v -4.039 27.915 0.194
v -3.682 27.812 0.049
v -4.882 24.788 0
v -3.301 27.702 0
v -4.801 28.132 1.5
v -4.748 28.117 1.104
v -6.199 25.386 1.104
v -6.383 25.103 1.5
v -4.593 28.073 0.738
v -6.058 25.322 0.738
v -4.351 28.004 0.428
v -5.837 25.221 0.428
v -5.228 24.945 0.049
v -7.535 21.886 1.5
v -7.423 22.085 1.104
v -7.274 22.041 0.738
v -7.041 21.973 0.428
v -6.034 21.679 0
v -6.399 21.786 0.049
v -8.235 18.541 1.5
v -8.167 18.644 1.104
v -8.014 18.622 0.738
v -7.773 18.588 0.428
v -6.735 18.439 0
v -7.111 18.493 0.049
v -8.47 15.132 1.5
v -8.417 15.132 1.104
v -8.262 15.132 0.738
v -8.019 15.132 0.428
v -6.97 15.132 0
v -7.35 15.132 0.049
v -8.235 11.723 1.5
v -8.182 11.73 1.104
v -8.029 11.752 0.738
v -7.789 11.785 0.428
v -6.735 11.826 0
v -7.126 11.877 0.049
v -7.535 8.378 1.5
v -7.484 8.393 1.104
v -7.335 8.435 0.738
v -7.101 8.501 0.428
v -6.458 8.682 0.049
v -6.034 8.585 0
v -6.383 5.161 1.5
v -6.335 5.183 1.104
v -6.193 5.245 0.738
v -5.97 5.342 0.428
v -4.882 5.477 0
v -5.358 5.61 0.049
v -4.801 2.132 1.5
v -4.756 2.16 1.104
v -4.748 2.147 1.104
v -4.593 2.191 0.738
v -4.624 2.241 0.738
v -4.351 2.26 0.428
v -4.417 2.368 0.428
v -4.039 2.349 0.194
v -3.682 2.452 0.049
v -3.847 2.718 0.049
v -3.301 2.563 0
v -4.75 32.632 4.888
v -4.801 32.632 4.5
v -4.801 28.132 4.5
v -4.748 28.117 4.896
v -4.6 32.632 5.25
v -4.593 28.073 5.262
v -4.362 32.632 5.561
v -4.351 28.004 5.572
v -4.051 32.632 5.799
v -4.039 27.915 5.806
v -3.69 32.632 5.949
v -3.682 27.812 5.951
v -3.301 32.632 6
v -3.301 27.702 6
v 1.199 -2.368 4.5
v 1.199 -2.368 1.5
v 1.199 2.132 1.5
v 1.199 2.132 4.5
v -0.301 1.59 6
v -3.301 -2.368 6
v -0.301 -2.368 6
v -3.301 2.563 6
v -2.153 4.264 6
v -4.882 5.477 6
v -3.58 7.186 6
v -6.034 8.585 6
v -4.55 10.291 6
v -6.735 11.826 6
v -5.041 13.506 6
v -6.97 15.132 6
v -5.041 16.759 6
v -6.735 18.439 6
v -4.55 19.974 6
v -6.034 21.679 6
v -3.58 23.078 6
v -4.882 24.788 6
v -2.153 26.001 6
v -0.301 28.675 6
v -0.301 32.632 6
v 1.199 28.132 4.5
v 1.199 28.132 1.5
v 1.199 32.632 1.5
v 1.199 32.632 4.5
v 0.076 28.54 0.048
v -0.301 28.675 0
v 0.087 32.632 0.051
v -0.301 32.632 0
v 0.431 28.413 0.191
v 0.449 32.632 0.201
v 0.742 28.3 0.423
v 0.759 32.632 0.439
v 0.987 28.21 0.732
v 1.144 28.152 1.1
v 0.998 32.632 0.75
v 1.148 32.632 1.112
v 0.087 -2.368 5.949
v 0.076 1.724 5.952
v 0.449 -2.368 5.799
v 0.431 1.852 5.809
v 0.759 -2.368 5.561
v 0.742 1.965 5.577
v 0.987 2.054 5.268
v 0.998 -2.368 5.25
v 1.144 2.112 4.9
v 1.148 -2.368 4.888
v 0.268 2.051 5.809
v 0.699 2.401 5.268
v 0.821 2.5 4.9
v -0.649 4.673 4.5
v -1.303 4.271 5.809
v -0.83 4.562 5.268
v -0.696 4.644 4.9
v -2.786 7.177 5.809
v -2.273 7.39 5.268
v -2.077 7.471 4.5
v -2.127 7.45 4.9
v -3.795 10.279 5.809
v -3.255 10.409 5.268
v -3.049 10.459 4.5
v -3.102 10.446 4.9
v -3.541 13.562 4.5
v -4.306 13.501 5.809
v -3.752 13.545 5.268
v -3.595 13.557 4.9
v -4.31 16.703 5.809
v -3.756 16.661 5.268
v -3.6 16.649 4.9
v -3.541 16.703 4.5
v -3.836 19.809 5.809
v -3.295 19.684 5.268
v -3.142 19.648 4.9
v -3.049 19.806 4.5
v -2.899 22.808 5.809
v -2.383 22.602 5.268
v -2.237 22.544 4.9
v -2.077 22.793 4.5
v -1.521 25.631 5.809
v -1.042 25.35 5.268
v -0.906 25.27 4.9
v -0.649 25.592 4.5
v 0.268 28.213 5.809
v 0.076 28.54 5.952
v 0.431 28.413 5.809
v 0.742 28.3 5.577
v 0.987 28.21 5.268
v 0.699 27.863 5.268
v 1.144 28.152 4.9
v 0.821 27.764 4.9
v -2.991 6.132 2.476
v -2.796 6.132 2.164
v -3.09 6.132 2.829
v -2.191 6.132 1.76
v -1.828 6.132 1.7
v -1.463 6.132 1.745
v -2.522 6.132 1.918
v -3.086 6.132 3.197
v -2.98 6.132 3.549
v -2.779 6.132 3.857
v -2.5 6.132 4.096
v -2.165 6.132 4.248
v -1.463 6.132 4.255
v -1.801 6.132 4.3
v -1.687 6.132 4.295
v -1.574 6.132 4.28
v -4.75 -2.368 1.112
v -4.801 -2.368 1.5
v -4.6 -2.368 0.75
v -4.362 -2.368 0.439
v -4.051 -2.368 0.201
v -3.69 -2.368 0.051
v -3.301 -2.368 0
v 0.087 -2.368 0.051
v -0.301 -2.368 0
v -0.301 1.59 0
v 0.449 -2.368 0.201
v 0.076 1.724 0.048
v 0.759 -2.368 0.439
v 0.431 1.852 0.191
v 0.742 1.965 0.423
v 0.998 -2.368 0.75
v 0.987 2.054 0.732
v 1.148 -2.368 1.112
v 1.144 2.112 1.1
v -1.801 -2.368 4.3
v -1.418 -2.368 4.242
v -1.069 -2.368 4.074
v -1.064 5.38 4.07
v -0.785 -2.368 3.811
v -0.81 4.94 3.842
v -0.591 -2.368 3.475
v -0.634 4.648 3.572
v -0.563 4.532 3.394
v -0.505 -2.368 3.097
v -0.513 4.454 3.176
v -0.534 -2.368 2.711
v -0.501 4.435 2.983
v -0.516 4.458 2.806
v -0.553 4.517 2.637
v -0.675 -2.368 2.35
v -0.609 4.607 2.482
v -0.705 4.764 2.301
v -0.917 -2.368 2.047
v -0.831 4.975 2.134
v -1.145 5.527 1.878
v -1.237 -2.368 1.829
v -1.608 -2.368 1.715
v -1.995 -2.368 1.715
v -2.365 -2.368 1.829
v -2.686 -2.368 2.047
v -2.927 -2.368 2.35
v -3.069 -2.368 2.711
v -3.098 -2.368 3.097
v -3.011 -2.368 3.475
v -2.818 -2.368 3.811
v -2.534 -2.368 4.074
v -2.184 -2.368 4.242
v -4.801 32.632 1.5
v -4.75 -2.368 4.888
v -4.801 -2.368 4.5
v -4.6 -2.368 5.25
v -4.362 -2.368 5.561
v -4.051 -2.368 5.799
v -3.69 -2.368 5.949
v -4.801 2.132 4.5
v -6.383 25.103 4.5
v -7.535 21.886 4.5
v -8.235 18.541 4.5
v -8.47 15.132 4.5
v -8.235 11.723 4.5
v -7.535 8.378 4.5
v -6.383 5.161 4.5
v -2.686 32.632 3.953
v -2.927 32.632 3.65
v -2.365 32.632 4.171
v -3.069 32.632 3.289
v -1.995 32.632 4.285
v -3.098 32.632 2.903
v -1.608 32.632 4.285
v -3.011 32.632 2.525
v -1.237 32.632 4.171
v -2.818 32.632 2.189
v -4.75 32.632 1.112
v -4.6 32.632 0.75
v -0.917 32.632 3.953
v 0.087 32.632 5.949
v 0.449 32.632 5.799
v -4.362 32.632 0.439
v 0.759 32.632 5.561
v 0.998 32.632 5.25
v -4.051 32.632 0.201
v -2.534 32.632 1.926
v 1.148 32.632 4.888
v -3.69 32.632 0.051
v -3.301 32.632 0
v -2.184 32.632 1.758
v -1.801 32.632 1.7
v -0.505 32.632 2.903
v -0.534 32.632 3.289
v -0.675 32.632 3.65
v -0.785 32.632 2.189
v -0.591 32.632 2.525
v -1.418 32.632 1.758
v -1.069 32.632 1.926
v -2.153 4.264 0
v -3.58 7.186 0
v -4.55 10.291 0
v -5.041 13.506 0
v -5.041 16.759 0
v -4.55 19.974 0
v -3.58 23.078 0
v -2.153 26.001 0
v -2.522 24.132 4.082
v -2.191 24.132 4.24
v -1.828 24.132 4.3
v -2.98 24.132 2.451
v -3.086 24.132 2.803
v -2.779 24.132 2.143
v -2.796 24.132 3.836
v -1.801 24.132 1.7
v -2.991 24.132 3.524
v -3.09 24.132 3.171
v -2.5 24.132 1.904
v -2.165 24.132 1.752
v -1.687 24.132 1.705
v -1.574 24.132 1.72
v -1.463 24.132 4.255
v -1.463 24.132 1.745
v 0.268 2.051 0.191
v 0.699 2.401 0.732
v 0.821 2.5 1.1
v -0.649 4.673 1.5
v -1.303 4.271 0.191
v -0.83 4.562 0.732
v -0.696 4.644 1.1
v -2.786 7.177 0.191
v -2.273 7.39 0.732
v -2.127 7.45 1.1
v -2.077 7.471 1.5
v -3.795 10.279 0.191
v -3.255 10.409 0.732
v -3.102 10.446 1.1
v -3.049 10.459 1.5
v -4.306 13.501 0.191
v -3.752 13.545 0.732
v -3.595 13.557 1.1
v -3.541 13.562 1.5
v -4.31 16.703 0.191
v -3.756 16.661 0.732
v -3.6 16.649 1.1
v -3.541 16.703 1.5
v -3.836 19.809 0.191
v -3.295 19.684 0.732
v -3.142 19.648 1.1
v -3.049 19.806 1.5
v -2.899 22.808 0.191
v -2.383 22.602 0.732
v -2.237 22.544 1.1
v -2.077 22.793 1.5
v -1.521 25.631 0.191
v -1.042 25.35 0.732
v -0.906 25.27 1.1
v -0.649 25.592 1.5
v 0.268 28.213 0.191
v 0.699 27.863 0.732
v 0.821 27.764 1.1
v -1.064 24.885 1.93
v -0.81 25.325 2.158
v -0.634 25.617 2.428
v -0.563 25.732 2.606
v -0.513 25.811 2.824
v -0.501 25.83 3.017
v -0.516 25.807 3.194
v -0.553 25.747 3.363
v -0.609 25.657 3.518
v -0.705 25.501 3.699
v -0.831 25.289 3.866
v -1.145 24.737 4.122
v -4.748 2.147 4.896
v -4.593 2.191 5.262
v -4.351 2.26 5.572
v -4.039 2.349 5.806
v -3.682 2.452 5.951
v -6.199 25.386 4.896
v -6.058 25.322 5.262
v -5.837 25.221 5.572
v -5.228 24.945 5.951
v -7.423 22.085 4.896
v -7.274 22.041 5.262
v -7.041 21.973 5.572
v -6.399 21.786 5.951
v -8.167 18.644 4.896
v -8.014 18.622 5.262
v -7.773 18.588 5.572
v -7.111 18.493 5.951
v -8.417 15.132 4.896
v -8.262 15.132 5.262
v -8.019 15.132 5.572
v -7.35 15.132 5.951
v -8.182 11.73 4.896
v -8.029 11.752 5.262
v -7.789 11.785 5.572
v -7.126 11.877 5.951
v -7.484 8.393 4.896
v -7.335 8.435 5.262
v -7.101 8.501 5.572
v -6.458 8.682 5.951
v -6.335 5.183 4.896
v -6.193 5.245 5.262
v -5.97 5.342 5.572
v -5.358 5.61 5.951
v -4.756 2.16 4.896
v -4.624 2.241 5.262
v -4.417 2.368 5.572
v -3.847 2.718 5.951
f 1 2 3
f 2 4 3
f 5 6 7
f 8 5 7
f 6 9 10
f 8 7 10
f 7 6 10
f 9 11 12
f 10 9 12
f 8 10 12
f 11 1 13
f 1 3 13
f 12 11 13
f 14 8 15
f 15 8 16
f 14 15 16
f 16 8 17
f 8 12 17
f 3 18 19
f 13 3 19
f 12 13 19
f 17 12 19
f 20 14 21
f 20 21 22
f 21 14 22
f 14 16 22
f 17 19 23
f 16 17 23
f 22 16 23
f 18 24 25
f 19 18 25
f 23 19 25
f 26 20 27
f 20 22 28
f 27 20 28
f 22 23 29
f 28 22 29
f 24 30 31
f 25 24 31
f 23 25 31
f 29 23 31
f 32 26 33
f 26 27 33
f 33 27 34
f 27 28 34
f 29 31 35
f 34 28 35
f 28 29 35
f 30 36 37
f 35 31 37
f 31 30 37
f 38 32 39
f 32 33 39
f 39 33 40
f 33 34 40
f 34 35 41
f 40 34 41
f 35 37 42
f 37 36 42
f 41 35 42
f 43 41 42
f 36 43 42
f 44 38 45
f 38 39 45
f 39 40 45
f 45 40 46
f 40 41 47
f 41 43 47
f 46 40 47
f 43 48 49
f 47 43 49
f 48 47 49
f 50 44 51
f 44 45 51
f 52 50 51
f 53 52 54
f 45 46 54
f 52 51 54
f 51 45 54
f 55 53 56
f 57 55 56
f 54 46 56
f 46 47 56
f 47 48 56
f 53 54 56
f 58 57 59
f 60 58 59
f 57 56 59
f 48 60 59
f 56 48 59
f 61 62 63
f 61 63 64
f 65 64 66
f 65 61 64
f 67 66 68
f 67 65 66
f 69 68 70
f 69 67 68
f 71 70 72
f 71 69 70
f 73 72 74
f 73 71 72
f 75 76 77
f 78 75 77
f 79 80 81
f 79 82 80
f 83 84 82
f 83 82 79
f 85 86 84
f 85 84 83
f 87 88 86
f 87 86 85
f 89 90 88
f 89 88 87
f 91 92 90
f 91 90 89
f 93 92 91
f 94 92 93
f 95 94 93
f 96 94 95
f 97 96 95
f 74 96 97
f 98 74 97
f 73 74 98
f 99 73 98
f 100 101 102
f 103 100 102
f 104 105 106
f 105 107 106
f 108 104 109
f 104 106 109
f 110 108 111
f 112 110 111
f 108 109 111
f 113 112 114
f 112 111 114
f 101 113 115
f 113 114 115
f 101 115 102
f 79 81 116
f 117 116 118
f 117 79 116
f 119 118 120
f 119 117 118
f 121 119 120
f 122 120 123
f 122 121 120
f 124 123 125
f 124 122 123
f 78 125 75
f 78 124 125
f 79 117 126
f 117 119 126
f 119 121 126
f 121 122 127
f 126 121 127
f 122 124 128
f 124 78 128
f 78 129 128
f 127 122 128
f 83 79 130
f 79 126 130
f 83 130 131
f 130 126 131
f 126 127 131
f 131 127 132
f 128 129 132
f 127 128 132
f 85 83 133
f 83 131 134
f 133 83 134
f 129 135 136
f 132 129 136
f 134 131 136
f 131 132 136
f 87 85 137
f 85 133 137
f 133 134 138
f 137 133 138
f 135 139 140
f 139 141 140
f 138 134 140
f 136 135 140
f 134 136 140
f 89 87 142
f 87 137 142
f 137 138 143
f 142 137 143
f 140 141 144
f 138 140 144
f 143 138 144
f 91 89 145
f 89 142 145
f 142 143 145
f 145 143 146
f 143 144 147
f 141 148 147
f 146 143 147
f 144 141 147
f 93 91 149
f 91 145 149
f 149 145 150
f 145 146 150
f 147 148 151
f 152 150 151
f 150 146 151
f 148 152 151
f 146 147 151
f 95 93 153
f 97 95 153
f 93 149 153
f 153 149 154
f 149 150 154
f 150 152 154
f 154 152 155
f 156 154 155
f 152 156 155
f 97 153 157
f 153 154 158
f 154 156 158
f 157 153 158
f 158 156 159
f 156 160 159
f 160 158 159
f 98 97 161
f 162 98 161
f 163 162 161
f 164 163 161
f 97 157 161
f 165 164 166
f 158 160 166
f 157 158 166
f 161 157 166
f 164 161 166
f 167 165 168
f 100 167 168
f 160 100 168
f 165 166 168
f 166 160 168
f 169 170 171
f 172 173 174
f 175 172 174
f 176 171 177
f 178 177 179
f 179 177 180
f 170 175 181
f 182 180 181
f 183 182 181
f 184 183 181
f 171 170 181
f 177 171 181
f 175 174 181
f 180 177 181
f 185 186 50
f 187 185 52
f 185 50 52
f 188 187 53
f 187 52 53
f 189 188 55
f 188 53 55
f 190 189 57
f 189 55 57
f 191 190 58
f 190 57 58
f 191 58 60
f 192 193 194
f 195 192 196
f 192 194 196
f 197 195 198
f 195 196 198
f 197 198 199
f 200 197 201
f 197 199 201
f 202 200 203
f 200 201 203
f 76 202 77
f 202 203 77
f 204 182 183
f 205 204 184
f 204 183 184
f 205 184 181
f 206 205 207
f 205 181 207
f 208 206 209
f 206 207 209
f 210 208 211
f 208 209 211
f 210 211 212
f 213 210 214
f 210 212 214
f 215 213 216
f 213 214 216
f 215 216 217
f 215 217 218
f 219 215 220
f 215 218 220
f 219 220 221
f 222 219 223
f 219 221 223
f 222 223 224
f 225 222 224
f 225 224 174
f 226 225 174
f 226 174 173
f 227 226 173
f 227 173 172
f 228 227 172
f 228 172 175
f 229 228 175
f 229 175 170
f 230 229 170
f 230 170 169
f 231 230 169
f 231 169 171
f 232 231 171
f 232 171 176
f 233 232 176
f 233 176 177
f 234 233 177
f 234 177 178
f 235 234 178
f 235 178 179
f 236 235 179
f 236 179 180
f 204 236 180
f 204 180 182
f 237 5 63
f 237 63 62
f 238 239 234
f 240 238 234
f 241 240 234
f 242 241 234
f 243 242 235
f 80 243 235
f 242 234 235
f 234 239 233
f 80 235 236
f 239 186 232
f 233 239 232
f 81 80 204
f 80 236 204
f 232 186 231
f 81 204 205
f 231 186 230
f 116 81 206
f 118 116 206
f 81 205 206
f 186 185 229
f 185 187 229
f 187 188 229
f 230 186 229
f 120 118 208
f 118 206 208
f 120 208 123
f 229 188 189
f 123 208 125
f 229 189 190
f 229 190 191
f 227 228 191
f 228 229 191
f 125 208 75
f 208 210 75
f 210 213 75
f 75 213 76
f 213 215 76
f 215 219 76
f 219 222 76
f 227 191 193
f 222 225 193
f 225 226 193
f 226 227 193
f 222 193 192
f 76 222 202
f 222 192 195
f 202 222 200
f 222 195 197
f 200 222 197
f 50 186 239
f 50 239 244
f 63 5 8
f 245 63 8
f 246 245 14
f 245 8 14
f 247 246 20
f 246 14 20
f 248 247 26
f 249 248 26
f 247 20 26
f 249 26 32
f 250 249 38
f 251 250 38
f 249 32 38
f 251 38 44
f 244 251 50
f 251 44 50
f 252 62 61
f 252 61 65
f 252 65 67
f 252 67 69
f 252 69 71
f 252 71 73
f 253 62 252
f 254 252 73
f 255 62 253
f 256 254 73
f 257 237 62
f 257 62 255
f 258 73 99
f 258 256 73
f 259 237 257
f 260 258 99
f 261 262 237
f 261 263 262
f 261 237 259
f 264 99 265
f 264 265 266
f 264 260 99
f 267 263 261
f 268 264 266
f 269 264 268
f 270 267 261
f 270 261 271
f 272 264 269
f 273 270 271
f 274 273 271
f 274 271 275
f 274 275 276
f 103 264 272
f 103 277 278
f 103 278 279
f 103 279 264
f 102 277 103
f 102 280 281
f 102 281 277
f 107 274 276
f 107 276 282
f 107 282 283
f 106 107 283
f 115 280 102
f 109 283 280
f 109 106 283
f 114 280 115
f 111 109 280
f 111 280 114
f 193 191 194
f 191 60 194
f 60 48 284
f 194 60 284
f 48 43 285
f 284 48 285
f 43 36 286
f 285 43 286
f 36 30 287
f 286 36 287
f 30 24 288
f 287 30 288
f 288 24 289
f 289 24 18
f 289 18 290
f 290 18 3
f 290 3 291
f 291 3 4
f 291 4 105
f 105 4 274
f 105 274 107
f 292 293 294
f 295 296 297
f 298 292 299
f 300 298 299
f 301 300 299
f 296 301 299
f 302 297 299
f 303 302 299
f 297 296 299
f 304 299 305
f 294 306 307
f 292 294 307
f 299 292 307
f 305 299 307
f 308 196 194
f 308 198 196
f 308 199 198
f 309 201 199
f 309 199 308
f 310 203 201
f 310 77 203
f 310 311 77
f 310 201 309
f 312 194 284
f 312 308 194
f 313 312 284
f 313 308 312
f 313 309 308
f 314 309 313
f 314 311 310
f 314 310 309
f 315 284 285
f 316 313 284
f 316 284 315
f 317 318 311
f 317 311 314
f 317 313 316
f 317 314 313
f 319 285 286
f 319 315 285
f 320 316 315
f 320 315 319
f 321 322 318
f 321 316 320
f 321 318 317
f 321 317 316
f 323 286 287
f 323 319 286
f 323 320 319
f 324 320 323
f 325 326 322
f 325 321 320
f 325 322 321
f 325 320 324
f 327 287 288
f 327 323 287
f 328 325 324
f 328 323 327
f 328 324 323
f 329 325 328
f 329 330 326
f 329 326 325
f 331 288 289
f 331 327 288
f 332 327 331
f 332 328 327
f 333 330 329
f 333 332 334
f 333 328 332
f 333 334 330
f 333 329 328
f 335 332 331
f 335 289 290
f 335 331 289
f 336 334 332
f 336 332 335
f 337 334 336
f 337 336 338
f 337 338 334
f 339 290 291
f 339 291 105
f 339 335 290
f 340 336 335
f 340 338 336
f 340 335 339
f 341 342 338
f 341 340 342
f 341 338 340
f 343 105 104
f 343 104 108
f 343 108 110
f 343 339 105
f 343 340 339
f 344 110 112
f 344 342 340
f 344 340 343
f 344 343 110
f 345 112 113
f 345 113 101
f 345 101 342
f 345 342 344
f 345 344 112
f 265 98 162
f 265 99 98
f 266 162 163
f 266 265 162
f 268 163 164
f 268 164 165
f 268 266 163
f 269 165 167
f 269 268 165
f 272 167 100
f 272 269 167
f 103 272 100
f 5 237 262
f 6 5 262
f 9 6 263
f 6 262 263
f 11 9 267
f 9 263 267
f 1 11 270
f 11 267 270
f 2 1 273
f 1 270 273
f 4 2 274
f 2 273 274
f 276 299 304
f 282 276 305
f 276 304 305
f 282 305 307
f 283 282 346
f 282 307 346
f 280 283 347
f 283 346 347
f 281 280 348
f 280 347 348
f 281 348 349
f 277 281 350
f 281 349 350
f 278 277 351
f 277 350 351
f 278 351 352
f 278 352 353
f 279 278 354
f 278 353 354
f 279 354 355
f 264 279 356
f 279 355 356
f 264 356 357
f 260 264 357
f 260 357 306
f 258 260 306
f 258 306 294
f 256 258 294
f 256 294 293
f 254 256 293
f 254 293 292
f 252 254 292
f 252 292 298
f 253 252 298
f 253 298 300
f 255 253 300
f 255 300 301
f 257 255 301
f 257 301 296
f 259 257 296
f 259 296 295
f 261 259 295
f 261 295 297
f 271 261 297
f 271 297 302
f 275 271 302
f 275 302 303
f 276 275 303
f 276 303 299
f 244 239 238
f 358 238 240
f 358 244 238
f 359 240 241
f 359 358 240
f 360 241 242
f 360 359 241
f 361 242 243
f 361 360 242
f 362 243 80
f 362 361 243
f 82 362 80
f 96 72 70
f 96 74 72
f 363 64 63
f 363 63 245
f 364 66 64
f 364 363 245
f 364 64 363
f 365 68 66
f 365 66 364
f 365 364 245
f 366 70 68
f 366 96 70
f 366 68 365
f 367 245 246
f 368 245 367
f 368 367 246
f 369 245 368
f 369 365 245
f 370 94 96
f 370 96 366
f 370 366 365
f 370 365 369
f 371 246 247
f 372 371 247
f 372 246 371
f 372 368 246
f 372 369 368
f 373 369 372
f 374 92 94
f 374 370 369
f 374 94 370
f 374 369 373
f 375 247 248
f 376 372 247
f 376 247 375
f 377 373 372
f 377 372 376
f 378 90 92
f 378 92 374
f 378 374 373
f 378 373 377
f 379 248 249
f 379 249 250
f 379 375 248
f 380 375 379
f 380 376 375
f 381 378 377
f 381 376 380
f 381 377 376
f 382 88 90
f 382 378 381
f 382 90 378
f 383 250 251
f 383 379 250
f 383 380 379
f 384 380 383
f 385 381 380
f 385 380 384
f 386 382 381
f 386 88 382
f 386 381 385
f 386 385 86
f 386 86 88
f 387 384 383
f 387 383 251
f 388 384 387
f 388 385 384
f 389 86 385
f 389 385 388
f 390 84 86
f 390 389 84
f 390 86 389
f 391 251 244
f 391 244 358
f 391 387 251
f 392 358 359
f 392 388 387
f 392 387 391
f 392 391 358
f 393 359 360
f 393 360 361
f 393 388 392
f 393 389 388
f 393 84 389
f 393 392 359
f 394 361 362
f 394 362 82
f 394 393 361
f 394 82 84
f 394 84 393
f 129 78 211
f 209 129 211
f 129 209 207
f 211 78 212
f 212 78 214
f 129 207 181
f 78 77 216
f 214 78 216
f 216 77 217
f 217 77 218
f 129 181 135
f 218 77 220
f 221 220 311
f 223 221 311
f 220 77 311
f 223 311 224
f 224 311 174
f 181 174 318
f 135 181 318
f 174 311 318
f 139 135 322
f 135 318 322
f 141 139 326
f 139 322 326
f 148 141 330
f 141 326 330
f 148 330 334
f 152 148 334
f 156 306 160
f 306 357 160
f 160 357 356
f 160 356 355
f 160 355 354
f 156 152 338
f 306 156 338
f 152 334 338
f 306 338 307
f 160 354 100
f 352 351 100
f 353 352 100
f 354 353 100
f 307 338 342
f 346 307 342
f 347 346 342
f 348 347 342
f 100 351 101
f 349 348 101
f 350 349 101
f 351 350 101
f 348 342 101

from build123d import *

# Parameters (mm, degrees)
SKETCH1_W             = 6
SKETCH1_H             = 4.5
BOSS_EXTRUDE1_DEPTH   = 6
HOLE1_D               = 2.6
HOLE1_DEPTH           = 8.5
HOLE1_ON_FACE_2_D     = 2.6
HOLE1_ON_FACE_2_DEPTH = 8.5
FILLET1_R             = 1.5


with BuildPart() as part:
    # Sketch1 → Boss-Extrude1 (new body)
    with BuildSketch(Plane.XY):
        with BuildLine():
            Line((1.198715271, 28.132291187), (-4.801284729, 28.132291187))
            ThreePointArc((-4.801284729, 28.132291187), (-8.469932757, 15.132291187), (-4.801284729, 2.132291187))
            Line((-4.801284729, 2.132291187), (1.198715271, 2.132291187))
            ThreePointArc((1.198715271, 2.132291187), (-3.602600575, 15.132291187), (1.198715271, 28.132291187))
        make_face()
        with Locations((-1.801284729, 30.382291187)):
            Rectangle(SKETCH1_W, SKETCH1_H)
        with Locations((-1.801284729, -0.117708813)):
            Rectangle(SKETCH1_W, SKETCH1_H)
    extrude(amount=BOSS_EXTRUDE1_DEPTH)

    # Hole1
    with Locations(Plane(origin=(-1.801284729, 32.632291187, 3), x_dir=(0, 0, 1), z_dir=(0, 1, 0))):
        with Locations((0, 0)):
            Hole(HOLE1_D / 2, depth=HOLE1_DEPTH)

    # Hole1 on face 2
    with Locations(Plane(origin=(-1.801284729, -2.367708813, 3), x_dir=(0, 0, -1), z_dir=(0, -1, 0))):
        with Locations((0, 0)):
            Hole(HOLE1_ON_FACE_2_D / 2, depth=HOLE1_ON_FACE_2_DEPTH)

    # Fillet1
    fillet1_edges = [part.edges().sort_by_distance(p)[0] for p in [
        (1.198715271, 30.382291187, 6),
        (-4.801284729, -0.117708813, 0),
        (-8.469932757, 15.132291187, 0),
        (-4.801284729, 30.382291187, 0),
        (1.198715271, 30.382291187, 0),
        (-3.602600575, 15.132291187, 0),
        (-4.801284729, 30.382291187, 6),
        (-8.469932757, 15.132291187, 6),
        (-4.801284729, -0.117708813, 6),
        (1.198715271, -0.117708813, 6),
        (-3.602600575, 15.132291187, 6),
        (1.198715271, -0.117708813, 0),
    ]]
    fillet(fillet1_edges, radius=FILLET1_R)


solid = part.part
